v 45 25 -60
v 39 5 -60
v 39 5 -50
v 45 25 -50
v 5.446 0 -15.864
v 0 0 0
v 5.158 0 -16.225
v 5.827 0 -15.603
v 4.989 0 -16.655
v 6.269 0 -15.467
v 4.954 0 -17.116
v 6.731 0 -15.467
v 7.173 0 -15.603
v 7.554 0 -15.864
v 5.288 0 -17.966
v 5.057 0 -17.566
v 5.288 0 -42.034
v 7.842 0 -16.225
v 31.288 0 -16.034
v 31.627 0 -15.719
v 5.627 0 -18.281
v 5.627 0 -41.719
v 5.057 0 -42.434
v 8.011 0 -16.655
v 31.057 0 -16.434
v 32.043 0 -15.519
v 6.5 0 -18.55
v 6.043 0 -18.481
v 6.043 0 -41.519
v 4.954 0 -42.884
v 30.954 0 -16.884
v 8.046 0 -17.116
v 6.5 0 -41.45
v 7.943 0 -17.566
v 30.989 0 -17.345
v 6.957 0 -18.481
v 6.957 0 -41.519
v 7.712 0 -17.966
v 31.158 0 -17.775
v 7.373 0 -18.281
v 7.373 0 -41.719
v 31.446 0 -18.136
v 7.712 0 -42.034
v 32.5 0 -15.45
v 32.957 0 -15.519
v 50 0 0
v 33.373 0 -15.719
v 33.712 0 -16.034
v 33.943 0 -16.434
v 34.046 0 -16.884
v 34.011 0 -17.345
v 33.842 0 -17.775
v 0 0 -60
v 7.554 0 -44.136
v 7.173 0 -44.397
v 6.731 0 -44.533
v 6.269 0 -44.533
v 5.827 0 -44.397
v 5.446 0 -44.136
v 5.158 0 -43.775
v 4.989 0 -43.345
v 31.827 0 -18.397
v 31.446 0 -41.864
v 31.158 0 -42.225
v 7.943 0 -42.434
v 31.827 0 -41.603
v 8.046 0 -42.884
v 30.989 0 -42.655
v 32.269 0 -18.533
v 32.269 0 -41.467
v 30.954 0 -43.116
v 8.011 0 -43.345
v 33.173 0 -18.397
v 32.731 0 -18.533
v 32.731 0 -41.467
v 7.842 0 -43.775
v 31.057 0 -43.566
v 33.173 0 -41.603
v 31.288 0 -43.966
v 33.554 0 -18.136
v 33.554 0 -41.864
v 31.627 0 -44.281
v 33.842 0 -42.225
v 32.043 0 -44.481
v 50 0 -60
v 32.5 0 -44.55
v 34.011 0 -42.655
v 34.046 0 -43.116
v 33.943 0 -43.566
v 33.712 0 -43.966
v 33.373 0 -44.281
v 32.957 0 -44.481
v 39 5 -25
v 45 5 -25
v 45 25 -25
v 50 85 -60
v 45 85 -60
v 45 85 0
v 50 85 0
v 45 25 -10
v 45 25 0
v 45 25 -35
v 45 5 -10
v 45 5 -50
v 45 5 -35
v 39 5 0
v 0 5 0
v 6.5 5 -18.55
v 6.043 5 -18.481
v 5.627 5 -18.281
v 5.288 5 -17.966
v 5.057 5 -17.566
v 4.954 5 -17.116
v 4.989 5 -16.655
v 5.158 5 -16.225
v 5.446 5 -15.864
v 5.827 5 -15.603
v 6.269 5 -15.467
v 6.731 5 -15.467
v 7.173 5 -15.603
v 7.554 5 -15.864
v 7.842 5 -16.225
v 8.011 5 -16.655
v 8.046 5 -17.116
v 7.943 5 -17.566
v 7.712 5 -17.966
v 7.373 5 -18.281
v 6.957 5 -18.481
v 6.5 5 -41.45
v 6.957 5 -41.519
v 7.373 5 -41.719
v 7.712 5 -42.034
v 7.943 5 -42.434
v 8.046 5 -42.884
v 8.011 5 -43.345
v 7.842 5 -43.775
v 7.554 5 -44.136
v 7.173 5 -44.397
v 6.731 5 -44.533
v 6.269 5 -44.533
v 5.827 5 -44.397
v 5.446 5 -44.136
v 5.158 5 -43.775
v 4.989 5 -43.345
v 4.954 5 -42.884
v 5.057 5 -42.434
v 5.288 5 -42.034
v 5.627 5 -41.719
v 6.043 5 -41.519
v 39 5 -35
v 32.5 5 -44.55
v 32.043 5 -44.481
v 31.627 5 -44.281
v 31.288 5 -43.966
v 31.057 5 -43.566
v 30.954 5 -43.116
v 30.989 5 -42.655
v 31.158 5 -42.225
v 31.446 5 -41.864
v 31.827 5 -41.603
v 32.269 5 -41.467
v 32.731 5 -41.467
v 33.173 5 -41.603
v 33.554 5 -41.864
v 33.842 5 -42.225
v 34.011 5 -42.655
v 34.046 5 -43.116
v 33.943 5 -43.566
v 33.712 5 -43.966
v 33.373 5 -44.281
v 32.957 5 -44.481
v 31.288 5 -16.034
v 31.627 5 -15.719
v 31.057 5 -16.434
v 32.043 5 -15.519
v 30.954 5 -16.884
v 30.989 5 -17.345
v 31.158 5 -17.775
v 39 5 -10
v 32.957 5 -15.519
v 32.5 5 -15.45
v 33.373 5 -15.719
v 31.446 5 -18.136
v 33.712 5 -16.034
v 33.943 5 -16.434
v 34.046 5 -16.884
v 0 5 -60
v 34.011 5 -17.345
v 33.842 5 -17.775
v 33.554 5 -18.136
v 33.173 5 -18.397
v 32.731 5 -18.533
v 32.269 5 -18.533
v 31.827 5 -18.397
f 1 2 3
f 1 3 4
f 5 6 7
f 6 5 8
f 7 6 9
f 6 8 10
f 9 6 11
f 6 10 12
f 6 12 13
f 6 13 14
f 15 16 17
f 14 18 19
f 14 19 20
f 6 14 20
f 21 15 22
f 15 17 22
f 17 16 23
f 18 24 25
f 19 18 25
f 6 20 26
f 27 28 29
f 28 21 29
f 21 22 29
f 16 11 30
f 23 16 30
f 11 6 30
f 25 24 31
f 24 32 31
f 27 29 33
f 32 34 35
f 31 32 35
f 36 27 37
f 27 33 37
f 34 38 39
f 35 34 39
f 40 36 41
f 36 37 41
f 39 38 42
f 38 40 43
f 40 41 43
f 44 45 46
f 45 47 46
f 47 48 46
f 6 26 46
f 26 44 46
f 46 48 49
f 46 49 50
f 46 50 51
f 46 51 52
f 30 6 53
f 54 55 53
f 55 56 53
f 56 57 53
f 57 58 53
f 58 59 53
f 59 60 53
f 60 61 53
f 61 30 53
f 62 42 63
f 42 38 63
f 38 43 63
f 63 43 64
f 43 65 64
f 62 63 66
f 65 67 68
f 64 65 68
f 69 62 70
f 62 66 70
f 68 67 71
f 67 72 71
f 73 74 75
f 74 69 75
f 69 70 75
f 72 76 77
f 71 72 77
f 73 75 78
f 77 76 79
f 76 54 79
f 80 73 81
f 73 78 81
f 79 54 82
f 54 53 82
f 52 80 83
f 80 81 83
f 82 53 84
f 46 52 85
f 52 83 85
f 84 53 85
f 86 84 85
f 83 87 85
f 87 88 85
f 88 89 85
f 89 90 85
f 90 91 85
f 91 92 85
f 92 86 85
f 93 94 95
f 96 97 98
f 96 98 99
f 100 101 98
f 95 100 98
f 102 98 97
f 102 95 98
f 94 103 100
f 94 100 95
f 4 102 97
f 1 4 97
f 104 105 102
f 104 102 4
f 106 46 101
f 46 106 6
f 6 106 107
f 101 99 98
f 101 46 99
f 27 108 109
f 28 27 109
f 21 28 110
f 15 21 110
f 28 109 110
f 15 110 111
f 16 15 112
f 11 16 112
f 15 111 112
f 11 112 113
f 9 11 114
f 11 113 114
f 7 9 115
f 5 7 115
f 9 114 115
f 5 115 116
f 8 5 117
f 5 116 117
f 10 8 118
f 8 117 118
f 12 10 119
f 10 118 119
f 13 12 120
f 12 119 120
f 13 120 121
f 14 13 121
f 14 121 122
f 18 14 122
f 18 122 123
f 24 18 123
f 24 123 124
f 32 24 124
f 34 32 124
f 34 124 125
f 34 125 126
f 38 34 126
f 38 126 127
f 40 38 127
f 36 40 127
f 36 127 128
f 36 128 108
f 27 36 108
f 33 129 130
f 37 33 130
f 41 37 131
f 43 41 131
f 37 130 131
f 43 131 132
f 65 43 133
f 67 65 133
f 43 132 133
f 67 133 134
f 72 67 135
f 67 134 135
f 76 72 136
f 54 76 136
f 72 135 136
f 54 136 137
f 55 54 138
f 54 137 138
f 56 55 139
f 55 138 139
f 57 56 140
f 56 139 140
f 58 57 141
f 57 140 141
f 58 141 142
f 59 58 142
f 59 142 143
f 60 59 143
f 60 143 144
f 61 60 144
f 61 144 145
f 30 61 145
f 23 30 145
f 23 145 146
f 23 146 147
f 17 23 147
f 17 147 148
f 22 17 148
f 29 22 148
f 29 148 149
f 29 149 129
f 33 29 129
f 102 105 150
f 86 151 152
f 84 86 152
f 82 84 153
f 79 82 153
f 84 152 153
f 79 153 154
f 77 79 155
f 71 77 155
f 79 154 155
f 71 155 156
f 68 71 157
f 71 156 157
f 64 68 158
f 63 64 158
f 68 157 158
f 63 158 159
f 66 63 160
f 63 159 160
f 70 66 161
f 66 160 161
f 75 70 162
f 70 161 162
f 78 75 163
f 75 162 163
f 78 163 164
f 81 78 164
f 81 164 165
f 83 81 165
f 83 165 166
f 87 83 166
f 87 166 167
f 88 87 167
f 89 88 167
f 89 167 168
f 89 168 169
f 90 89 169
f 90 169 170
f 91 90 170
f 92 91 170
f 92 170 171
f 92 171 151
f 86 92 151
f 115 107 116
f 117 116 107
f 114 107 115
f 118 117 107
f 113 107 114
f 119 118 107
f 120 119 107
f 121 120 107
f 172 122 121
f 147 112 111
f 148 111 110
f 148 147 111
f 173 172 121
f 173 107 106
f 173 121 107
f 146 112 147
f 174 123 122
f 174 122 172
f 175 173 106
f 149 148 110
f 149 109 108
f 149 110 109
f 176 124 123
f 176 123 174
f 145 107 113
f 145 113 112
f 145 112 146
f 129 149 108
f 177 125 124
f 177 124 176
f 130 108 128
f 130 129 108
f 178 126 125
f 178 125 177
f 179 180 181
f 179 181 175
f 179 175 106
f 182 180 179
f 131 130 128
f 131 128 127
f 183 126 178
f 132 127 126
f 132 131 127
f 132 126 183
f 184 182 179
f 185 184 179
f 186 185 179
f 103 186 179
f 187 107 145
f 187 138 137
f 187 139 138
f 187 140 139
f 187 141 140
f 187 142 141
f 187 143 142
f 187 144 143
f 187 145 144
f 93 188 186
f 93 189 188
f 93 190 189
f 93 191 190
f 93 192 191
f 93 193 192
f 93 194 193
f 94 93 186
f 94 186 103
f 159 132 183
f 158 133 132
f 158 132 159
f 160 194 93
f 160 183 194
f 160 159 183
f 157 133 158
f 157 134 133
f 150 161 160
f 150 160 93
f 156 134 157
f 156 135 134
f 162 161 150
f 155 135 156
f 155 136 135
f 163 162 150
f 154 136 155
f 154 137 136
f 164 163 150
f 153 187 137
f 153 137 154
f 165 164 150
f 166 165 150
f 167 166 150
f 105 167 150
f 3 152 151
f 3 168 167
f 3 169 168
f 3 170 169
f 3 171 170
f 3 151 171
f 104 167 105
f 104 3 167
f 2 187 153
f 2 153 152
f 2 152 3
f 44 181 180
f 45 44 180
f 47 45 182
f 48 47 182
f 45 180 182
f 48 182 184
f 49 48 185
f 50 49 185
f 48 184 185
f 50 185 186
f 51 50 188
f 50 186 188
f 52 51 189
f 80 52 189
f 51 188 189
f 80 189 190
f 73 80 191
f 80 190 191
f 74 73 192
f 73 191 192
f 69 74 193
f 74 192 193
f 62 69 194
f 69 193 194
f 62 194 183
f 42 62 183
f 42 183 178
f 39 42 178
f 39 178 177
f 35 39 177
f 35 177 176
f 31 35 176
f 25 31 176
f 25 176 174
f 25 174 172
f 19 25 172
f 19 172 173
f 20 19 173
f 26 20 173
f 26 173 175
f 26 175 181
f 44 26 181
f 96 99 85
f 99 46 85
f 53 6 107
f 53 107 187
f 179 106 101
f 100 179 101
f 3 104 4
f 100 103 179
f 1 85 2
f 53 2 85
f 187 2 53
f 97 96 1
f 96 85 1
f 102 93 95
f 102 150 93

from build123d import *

# Parameters (mm, degrees)
SKETCH_2_W          = 50
SKETCH_2_H          = 60
EXTRUDE_1_DEPTH     = 5
SKETCH_3_W          = 5
SKETCH_3_H          = 60
EXTRUDE_2_DEPTH     = 80
EXTRUDE_3_DEPTH     = 10
EXTRUDE_4_DEPTH     = 10
EXTRUDE_5_DEPTH     = 5
SKETCH_7_R          = 1.55
CUT_EXTRUDE_1_DEPTH = 112.803398875


with BuildPart() as part:
    # 草图2 → 凸台-拉伸1 (new body)
    with BuildSketch(Plane(origin=(0, 0, 0), x_dir=(1, 0, 0), z_dir=(0, 1, 0))):
        with Locations((25, 30)):
            Rectangle(SKETCH_2_W, SKETCH_2_H)
    extrude(amount=EXTRUDE_1_DEPTH)

    # 草图3 → 凸台-拉伸2 (add)
    with BuildSketch(Plane(origin=(0, 5, 0), x_dir=(1, 0, 0), z_dir=(0, 1, 0))):
        with Locations((47.5, 30)):
            Rectangle(SKETCH_3_W, SKETCH_3_H)
    extrude(amount=EXTRUDE_2_DEPTH)

    # 草图4 → 凸台-拉伸3 (add)
    with BuildSketch(Plane.XY):
        Polygon((39, 5), (45, 25), (45, 5), align=None)
    extrude(amount=-EXTRUDE_3_DEPTH)

    # 草图5 → 凸台-拉伸4 (add)
    with BuildSketch(Plane(origin=(0, 0, -60), x_dir=(-1, 0, 0), z_dir=(0, 0, -1))):
        Polygon((-39, 5), (-45, 25), (-45, 5), align=None)
    extrude(amount=-EXTRUDE_4_DEPTH)

    # 草图6 → 凸台-拉伸5 (add, symmetric)
    with BuildSketch(Plane(origin=(0, 0, -30), x_dir=(-1, 0, 0), z_dir=(0, 0, -1))):
        Polygon((-39, 5), (-45, 25), (-45, 5), align=None)
    extrude(amount=EXTRUDE_5_DEPTH, both=True)

    # 草图7 → 切除-拉伸1 (cut, through all)
    with BuildSketch(Plane(origin=(0, 5, 0), x_dir=(1, 0, 0), z_dir=(0, 1, 0))):
        with Locations(Location((6.5, 43, 0), (0, 0, 270))):
            Circle(SKETCH_7_R)
        with Locations(Location((32.5, 43, 0), (0, 0, 90))):
            Circle(SKETCH_7_R)
        with Locations(Location((6.5, 17, 0), (0, 0, 90))):
            Circle(SKETCH_7_R)
        with Locations(Location((32.5, 17, 0), (0, 0, 270))):
            Circle(SKETCH_7_R)
    extrude(amount=-CUT_EXTRUDE_1_DEPTH, mode=Mode.SUBTRACT)


solid = part.part
